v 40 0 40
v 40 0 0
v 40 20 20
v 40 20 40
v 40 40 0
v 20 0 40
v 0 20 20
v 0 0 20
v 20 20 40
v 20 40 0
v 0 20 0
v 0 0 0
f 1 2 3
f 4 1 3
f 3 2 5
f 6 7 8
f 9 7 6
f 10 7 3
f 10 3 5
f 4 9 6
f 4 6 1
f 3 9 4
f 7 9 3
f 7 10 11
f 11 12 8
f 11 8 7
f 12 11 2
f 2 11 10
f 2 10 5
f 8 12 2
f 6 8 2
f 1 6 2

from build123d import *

# Parameters (mm, degrees)
SKETCH1_W           = 40
SKETCH1_H           = 40
BOSS_EXTRUDE1_DEPTH = 40
CUT_EXTRUDE1_DEPTH  = 40
CUT_EXTRUDE2_DEPTH  = 40
CUT_EXTRUDE3_DEPTH  = 40


with BuildPart() as part:
    # Sketch1 → Boss-Extrude1 (new body)
    with BuildSketch(Plane.XY):
        with Locations((20, 20)):
            Rectangle(SKETCH1_W, SKETCH1_H)
    extrude(amount=BOSS_EXTRUDE1_DEPTH)

    # Sketch2 → Cut-Extrude1 (cut)
    with BuildSketch(Plane.XY.offset(40)):
        Polygon((0, 20), (0, 40), (20, 40), align=None)
    extrude(amount=-CUT_EXTRUDE1_DEPTH, mode=Mode.SUBTRACT)

    # Sketch3 → Cut-Extrude2 (cut)
    with BuildSketch(Plane.ZY):
        Polygon((40, 20), (20, 20), (0, 40), (40, 40), align=None)
    extrude(amount=-CUT_EXTRUDE2_DEPTH, mode=Mode.SUBTRACT)

    # Sketch4 → Cut-Extrude3 (cut)
    with BuildSketch(Plane(origin=(0, 20, 0), x_dir=(1, 0, 0), z_dir=(0, 1, 0))):
        Polygon((0, -20), (20, -40), (0, -40), align=None)
    extrude(amount=-CUT_EXTRUDE3_DEPTH, mode=Mode.SUBTRACT)


solid = part.part
